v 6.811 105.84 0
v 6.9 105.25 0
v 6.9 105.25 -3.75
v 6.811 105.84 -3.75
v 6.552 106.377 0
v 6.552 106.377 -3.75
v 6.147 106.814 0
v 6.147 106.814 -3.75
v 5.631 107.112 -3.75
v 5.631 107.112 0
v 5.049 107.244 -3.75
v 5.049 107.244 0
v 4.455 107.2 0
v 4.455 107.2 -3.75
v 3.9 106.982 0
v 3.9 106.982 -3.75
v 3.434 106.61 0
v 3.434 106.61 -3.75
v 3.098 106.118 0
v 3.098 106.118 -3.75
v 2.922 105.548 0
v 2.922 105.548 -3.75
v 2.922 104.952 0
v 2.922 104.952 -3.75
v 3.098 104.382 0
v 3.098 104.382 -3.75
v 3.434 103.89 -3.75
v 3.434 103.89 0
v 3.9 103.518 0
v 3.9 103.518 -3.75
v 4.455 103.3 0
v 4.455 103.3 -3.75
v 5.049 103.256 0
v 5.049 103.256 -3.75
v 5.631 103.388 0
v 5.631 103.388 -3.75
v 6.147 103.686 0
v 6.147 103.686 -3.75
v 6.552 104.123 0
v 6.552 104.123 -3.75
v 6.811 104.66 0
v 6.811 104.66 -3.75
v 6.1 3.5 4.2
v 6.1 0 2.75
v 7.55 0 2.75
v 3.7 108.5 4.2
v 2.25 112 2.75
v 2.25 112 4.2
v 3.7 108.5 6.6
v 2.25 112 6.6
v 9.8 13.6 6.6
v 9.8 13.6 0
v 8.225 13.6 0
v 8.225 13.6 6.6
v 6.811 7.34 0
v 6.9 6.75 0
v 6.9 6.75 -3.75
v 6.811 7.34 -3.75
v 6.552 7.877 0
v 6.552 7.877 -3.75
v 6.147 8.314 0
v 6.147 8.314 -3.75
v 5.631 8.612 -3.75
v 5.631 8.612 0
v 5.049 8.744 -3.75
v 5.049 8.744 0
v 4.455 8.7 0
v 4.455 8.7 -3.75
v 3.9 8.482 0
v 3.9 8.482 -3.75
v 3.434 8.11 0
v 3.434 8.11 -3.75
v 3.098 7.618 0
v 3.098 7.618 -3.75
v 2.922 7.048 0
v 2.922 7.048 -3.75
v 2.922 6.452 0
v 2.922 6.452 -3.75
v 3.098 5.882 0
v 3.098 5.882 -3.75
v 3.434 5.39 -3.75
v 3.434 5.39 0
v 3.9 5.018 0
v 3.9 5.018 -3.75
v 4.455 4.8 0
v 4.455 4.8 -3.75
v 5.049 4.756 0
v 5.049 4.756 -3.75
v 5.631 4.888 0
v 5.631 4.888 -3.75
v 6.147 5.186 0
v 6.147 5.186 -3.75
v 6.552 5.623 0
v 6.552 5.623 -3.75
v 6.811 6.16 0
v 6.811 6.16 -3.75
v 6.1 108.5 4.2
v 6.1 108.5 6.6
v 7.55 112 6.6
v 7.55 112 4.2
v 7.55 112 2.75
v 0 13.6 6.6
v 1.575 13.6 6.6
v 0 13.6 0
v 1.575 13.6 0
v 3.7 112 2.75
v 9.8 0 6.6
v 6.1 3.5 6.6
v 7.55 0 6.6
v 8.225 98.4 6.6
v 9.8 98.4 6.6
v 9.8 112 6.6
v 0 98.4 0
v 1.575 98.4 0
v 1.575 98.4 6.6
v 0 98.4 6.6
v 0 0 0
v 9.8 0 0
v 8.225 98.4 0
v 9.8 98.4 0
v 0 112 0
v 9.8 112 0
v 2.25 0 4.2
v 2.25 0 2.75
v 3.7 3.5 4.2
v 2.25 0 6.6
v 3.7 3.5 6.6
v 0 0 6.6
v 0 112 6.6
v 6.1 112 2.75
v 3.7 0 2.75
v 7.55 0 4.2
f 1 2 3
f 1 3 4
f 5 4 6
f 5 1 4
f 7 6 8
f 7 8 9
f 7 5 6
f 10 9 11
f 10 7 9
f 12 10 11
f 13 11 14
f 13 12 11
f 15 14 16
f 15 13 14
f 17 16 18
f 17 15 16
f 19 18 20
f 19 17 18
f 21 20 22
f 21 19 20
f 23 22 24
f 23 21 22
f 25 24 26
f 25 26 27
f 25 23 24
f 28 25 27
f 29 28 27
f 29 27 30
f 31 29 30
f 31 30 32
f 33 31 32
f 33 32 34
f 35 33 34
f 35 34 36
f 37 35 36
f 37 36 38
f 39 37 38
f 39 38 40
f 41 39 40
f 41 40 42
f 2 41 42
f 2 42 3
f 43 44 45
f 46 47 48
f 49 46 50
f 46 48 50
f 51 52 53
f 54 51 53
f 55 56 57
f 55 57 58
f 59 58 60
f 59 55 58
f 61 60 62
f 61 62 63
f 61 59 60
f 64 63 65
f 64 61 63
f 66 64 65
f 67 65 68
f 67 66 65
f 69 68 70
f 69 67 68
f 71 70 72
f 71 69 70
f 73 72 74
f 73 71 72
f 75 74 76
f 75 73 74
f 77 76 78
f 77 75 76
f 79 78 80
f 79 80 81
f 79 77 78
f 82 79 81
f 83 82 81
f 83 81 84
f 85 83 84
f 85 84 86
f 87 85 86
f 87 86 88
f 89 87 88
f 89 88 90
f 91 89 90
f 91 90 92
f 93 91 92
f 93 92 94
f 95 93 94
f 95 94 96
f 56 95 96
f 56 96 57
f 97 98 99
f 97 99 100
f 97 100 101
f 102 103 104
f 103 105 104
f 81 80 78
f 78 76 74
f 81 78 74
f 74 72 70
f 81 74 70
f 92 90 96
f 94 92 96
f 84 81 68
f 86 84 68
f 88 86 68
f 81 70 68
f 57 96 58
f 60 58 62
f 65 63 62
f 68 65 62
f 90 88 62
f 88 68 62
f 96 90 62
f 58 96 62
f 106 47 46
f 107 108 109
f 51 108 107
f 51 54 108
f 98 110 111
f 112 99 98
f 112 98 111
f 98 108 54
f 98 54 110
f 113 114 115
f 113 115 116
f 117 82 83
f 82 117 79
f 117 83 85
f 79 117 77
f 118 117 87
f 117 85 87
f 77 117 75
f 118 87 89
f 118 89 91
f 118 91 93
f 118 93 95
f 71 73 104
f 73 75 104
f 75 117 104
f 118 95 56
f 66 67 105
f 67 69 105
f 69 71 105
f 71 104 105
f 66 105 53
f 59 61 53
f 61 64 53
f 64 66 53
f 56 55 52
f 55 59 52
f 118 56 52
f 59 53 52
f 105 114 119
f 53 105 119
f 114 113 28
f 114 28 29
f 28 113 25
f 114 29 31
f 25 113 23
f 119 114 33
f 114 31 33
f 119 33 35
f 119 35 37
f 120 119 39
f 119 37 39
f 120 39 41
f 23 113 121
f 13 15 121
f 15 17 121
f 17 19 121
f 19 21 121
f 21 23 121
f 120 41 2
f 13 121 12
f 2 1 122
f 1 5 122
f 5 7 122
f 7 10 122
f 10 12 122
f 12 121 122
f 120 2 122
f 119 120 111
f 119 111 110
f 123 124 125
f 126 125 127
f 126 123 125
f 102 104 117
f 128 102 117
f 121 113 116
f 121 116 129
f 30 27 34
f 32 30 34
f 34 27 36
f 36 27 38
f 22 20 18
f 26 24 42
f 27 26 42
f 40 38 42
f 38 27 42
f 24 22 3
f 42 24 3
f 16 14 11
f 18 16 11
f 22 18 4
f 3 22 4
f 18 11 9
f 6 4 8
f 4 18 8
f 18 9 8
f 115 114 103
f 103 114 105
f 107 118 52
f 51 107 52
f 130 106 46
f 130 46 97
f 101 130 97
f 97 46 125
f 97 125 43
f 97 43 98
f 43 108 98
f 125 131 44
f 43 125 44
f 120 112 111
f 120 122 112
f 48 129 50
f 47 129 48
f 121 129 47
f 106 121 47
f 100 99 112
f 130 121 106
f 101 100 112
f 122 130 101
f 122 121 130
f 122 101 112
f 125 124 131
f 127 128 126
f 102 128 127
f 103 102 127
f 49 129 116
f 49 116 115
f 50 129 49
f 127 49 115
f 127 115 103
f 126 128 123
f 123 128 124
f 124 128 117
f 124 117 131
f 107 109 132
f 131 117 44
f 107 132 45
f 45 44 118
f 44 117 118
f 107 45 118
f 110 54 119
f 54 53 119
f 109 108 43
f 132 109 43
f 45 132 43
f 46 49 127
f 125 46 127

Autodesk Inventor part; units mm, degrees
ref_plane "YZ Plane" through (0, 0, 0) normal (1, 0, 0) x (0, 1, 0)
ref_plane "XZ Plane" through (0, 0, 0) normal (0, 1, 0) x (-1, 0, 0)
ref_plane "XY Plane" through (0, 0, 0) normal (0, 0, 1) x (1, 0, 0)
sketch "Sketch1" plane through (0, 0, 0) normal (0, 0, 1) x (1, 0, 0)
  line L0 (0, 0) -> (9.8, 0)
  line L1 (9.8, 0) -> (9.8, 13.6)
  line L2 (9.8, 13.6) -> (0, 13.6)
  line L3 (0, 13.6) -> (0, 0)
  line L4 (1.575, 13.6) -> (8.225, 13.6)
  line L5 (8.225, 13.6) -> (8.225, 98.4)
  line L6 (8.225, 98.4) -> (1.575, 98.4)
  line L7 (1.575, 98.4) -> (1.575, 13.6)
  line L8 (1.575, 56) -> (8.225, 56) construction
  line L9 (0, 112) -> (9.8, 112)
  line L10 (9.8, 112) -> (9.8, 98.4)
  line L11 (9.8, 98.4) -> (0, 98.4)
  line L12 (0, 98.4) -> (0, 112)
  line L13 (1.575, 98.4) -> (8.225, 98.4)
  circle A0 centre (4.9, 6.75) radius 2
  line L14 (4.9, 6.75) -> (4.9, 56) construction
  circle A1 centre (4.9, 105.25) radius 2
  line L15 (4.9, 105.25) -> (4.9, 56) construction
  point P0 (4.9, 13.6)
  point P1 (4.9, 98.4)
  dimension "d0" = 9.8
  dimension "d1" = 13.6
  dimension "d2" = 112
  dimension "d3" = 6.65
  dimension "d6" = 4
  dimension "d7" = 98.5
extrude "Extrusion1" add sketch "Sketch1" along normal blind 6.6 contours L3 L2 L1 L0 | L7 L6 L5 L2 | L11 L12 L9 L10 L6 | A0 | A1
extrude "Extrusion2" add sketch "Sketch1" against normal blind 3.75 contours A0 | A1
sketch "Sketch2" plane through (0, 0, 6.6) normal (0, 0, 1) x (1, 0, 0)
  line L0 (0, 0) -> (9.8, 0) projected
  line L1 (3.7, 0) -> (6.1, 0)
  line L2 (6.1, 0) -> (6.1, 112)
  line L3 (6.1, 112) -> (3.7, 112)
  line L4 (3.7, 112) -> (3.7, 0)
  line L5 (9.8, 112) -> (0, 112) projected
  point P0 (4.9, 112)
  dimension "d10" = 2.4
extrude "Extrusion3" cut sketch "Sketch2" against normal blind 2.4
chamfer "Chamfer1" distance 3.5 angle 22.5 1 edges at (3.7, 112, 5.4) measured on face at (3.7, 74.6667, 5.8)
chamfer "Chamfer2" distance 3.5 angle 22.5 1 edges at (6.1, 112, 5.4) measured on face at (6.1, 37.3333, 5.8)
chamfer "Chamfer3" distance 3.5 angle 22.5 1 edges at (4.9, 112, 4.2) measured on face at (4.5, 36.1667, 4.2)
chamfer "Chamfer4" distance 3.5 angle 22.5 1 edges at (3.7, 0, 5.4) measured on face at (3.7, 36.1667, 5)
chamfer "Chamfer5" distance 3.5 angle 22.5 1 edges at (6.1, 0, 5.4) measured on face at (6.1, 36.1667, 5.8)
chamfer "Chamfer6" distance 3.5 angle 22.5 1 edges at (4.9, 0, 4.2) measured on face at (5.3, 73.5, 4.2)
properties part number "CCA Rail"
